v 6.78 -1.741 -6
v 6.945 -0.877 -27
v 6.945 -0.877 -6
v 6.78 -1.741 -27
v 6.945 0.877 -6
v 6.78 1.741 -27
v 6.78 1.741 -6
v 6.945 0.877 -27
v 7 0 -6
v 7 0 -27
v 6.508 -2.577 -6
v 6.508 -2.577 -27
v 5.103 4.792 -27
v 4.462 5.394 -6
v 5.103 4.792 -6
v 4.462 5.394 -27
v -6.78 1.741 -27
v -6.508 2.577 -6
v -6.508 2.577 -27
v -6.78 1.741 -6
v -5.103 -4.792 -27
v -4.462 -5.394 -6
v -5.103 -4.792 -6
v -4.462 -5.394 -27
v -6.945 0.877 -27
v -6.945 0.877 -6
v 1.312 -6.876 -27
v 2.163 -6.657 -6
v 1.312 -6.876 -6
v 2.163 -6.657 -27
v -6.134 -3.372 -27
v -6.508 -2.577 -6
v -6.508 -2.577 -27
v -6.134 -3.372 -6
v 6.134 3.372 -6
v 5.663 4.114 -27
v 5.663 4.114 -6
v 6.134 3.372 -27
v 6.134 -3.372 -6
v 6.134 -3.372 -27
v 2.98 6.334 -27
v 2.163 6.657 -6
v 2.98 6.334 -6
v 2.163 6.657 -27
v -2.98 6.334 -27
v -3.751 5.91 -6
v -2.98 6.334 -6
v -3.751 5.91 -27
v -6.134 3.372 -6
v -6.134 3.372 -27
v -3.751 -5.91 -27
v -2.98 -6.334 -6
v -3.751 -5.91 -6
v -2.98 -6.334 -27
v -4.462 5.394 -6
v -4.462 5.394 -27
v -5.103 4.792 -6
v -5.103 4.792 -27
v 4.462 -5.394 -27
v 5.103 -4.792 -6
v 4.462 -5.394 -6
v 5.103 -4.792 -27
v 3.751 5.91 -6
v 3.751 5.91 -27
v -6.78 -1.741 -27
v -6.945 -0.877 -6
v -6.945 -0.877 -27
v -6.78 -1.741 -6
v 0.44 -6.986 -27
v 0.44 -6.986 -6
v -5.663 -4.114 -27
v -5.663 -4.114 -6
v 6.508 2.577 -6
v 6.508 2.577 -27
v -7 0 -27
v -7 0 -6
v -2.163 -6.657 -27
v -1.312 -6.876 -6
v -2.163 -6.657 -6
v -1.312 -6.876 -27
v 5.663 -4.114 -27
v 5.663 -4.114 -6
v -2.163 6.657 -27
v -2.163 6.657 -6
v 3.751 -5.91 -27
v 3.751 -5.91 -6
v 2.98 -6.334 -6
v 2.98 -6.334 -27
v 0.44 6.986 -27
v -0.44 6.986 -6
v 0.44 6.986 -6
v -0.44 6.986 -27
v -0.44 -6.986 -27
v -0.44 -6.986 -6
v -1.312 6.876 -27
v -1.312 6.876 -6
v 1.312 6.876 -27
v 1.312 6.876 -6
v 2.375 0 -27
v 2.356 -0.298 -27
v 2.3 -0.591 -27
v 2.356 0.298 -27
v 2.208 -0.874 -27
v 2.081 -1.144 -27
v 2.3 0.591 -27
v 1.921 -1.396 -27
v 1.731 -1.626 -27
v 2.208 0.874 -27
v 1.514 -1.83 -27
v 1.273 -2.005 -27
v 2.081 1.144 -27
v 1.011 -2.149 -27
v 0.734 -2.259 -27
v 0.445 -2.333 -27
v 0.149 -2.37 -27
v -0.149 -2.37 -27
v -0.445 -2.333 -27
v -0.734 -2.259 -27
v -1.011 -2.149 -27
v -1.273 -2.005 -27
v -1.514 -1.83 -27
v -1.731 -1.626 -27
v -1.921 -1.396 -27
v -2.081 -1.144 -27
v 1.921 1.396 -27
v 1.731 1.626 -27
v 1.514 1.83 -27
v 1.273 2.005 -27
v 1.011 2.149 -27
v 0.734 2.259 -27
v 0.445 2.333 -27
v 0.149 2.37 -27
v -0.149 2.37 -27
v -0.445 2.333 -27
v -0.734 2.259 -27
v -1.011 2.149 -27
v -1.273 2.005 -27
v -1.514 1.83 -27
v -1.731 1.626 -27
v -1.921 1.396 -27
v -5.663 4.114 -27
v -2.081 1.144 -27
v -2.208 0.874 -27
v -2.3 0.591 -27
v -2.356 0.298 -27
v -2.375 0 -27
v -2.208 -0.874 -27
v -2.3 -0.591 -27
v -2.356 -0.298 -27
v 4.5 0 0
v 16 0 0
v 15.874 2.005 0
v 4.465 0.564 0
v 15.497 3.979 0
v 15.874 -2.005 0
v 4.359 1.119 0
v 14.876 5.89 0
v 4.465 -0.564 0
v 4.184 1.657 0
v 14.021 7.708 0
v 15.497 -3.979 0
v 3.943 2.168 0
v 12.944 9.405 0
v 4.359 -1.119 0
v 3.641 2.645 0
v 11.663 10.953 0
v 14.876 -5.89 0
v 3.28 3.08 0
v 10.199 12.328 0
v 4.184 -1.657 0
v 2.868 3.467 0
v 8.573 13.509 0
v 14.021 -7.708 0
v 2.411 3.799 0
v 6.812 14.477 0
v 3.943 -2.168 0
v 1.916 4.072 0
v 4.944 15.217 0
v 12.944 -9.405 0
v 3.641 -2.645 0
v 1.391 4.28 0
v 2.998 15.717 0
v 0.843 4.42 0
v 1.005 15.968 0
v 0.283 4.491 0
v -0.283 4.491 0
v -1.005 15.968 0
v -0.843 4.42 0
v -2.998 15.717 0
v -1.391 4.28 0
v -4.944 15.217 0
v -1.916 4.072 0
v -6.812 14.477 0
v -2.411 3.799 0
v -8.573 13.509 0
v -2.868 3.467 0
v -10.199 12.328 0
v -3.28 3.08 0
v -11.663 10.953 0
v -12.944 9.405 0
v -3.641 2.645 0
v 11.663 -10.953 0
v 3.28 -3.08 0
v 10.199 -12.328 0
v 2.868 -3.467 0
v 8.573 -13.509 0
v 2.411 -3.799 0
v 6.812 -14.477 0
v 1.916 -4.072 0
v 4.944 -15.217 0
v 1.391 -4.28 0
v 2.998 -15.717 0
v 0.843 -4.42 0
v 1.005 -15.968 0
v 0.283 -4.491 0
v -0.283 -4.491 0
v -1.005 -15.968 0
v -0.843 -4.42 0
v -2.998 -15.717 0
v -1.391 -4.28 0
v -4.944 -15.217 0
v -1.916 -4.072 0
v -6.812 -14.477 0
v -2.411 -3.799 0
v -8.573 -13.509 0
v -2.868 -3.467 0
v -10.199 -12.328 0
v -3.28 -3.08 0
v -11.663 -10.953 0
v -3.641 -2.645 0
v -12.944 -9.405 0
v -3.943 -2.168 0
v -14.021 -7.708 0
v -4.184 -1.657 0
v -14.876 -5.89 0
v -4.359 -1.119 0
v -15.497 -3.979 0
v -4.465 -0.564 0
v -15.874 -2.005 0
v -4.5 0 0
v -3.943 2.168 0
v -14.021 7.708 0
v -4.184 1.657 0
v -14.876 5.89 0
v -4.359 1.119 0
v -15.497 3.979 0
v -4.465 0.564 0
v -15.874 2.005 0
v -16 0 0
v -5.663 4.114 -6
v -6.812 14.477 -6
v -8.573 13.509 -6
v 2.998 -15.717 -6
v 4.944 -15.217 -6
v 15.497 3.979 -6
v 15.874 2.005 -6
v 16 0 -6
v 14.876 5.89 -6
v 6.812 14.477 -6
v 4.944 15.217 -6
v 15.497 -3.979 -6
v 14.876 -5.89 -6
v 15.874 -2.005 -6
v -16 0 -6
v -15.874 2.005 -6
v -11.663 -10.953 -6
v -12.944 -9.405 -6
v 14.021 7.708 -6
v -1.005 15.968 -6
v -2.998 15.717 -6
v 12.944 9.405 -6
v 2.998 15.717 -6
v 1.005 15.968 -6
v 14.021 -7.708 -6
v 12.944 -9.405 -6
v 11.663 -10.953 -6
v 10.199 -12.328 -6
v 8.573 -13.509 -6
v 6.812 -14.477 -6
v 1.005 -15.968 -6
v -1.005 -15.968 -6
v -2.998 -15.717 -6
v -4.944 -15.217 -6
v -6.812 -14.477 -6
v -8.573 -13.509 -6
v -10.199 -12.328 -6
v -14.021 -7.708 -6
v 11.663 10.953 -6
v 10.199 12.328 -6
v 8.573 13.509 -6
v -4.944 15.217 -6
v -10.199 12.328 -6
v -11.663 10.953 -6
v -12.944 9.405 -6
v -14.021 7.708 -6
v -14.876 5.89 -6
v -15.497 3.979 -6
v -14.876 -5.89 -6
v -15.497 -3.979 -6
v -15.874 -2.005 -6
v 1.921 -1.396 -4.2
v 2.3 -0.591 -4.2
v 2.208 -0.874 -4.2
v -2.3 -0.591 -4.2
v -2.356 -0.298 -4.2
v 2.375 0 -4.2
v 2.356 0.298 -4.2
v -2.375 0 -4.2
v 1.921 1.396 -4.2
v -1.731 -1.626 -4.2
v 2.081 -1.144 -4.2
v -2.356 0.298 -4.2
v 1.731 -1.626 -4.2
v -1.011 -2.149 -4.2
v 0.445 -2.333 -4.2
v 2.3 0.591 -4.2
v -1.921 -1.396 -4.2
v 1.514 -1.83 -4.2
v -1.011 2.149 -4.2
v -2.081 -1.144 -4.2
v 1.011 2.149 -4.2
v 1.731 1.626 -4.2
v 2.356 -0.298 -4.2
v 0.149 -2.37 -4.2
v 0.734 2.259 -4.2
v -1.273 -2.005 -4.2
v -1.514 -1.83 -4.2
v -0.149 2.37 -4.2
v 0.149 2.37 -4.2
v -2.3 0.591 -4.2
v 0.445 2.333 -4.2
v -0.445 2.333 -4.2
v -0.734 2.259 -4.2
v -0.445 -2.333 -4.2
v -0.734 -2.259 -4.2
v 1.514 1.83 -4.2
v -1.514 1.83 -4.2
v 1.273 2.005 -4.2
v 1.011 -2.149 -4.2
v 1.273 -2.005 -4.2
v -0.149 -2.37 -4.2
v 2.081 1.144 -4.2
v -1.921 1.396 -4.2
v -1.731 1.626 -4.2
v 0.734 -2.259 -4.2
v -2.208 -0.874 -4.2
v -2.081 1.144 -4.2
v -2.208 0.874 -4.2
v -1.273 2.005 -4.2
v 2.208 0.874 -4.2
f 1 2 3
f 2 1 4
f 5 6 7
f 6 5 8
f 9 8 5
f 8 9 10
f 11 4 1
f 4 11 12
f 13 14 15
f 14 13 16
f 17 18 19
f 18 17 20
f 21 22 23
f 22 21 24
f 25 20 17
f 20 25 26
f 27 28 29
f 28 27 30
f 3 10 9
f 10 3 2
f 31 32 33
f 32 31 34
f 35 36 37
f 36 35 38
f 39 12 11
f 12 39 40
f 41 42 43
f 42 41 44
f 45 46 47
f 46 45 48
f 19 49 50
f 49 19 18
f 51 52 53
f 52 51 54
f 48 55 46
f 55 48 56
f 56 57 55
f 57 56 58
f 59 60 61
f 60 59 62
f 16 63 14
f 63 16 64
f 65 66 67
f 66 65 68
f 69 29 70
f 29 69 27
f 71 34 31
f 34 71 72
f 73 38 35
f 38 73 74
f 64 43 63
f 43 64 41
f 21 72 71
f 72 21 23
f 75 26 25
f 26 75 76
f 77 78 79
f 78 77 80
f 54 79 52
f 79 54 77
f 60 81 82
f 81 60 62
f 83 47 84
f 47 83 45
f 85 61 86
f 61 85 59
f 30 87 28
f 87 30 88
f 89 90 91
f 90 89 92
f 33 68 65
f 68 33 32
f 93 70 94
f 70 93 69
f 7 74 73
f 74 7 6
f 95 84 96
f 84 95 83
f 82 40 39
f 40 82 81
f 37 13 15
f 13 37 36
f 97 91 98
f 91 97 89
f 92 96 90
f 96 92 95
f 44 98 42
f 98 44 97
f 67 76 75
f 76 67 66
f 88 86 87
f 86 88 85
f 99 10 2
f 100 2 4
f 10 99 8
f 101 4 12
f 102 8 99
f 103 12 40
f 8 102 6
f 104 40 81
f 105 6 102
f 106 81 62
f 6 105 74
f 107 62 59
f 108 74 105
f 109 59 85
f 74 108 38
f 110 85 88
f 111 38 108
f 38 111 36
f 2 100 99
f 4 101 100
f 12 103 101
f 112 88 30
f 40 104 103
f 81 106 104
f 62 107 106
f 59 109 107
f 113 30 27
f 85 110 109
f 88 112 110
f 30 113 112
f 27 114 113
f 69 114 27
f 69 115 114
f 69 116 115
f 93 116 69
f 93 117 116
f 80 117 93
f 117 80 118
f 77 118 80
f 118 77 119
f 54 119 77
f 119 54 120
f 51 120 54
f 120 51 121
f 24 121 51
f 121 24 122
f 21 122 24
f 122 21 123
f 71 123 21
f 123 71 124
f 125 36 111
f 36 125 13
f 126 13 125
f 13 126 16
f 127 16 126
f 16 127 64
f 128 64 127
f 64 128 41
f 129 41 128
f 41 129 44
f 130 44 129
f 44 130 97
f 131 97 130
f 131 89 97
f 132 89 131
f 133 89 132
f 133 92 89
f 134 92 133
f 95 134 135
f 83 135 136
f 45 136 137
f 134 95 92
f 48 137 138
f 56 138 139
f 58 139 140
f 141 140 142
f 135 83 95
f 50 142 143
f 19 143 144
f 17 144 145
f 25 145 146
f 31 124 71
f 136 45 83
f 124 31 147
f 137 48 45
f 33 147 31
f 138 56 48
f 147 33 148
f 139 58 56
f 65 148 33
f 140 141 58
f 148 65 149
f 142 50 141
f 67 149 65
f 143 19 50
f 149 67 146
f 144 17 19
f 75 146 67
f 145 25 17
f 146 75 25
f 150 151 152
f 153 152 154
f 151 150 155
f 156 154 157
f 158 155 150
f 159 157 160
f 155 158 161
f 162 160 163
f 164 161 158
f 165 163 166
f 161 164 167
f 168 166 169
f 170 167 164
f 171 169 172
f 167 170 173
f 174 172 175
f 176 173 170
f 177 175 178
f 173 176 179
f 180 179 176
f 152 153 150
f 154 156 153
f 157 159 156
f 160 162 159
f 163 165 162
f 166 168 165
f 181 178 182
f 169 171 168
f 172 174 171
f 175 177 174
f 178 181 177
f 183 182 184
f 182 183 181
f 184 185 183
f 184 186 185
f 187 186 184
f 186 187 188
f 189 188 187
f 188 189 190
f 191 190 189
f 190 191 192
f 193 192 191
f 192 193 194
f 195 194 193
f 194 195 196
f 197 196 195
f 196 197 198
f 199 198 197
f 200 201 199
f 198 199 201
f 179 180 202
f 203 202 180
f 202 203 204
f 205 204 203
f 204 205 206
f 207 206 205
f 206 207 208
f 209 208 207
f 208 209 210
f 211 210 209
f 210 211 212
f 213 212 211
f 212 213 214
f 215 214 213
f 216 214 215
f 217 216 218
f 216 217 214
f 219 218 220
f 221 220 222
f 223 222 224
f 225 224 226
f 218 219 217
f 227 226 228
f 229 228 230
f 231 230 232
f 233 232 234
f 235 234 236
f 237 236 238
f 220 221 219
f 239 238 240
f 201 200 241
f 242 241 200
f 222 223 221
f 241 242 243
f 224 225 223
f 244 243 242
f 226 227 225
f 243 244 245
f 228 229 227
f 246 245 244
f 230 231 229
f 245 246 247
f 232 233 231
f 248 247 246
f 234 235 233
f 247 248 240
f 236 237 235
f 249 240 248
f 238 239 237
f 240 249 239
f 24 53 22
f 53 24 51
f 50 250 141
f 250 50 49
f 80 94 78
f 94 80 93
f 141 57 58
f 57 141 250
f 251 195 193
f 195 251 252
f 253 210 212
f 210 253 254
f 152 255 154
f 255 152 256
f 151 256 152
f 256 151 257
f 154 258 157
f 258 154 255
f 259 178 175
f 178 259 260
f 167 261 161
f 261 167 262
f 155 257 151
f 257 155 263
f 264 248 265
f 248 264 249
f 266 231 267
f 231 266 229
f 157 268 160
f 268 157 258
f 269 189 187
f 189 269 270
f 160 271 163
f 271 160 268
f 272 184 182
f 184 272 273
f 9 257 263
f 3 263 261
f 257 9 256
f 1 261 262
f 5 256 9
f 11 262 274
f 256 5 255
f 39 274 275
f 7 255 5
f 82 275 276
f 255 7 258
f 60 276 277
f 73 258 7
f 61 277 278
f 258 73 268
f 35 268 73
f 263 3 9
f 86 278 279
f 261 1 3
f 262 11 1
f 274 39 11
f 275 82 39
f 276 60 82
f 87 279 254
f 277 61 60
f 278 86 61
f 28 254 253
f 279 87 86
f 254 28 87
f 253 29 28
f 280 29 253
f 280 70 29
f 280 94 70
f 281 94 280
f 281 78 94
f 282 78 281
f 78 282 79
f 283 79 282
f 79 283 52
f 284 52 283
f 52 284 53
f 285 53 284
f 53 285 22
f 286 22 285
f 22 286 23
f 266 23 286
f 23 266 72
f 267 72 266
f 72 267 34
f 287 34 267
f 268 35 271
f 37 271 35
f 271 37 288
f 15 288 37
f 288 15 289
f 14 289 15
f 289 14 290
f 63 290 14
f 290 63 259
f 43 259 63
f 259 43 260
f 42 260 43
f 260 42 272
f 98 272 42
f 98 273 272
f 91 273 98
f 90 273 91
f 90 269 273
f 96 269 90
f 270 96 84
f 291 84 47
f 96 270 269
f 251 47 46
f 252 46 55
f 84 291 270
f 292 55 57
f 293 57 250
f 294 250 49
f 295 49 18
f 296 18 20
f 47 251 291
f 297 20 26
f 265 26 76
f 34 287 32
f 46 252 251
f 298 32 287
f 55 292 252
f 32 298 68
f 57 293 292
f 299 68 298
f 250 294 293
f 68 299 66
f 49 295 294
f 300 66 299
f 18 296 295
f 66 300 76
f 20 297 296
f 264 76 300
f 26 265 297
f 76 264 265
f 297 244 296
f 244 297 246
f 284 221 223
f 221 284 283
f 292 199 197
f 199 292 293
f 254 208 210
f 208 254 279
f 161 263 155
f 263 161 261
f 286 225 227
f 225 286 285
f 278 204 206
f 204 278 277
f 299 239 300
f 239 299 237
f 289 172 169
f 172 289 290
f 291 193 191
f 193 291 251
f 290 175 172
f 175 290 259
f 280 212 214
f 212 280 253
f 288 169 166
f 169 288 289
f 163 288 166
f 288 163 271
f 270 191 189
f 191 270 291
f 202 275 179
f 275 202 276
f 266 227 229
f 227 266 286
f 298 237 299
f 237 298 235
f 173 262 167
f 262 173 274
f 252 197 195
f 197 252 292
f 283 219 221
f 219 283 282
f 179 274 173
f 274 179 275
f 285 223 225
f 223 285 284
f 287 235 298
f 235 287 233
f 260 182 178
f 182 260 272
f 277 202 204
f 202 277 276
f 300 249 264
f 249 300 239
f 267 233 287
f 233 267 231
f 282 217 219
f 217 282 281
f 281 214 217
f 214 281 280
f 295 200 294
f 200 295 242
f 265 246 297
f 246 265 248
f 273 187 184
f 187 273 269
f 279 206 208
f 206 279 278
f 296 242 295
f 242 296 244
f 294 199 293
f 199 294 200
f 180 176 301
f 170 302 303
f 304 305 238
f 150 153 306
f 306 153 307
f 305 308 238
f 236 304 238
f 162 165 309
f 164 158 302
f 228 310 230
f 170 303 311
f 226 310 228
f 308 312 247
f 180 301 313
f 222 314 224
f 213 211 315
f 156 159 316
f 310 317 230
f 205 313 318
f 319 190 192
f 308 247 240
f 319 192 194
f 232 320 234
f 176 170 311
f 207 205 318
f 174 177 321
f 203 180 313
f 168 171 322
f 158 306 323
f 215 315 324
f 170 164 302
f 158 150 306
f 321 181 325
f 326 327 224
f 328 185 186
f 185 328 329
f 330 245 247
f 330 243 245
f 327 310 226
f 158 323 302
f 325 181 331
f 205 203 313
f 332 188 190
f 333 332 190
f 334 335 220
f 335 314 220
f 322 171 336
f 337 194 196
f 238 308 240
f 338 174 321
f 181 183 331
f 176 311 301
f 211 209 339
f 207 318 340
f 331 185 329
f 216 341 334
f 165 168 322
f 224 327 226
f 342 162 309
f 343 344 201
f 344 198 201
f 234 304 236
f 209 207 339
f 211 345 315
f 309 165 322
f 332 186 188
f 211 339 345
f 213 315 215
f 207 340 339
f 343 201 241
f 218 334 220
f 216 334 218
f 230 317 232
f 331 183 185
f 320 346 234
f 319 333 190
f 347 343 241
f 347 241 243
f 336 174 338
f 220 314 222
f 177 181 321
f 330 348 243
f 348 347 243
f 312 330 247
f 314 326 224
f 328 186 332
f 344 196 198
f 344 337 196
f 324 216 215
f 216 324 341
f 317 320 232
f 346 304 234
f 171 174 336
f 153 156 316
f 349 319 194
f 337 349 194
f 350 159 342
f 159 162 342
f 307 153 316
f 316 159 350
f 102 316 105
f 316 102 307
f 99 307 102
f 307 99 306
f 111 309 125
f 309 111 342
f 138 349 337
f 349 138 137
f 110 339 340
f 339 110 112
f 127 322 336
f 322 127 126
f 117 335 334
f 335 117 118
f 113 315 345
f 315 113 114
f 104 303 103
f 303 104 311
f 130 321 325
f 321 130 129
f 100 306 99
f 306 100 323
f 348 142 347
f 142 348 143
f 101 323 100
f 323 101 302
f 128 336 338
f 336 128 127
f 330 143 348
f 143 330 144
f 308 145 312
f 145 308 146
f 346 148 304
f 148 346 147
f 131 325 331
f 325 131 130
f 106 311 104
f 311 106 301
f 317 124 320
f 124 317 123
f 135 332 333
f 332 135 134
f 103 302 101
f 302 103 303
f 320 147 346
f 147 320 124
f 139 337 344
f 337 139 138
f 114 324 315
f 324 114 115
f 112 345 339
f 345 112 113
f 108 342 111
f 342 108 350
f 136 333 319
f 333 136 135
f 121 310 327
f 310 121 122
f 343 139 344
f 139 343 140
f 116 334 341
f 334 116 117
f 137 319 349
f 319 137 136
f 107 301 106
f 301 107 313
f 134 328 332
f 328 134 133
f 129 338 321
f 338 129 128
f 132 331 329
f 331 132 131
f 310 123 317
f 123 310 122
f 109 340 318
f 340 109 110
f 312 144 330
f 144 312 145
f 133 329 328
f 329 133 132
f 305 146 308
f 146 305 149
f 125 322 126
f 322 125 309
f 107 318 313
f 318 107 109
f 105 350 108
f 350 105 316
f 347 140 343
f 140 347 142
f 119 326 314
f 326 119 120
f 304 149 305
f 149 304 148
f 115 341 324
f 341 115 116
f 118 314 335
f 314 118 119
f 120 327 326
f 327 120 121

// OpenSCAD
$fn = 50;


difference() {
	union() {
		translate(v = [0, 0, -27.0000000000]) {
			cylinder(h = 27, r = 7.0000000000);
		}
		translate(v = [0, 0, -6.0000000000]) {
			cylinder(h = 6, r = 16.0000000000);
		}
	}
	union() {
		translate(v = [0, 0, 0]) {
			rotate(a = [0, 0, 0]) {
				difference() {
					union() {
						#translate(v = [0, 0, -27.0000000000]) {
							cylinder(h = 27, r = 2.2500000000);
						}
						#translate(v = [0, 0, -4.2000000000]) {
							cylinder(h = 4.2000000000, r1 = 2.3750000000, r2 = 4.5000000000);
						}
						#translate(v = [0, 0, -27.0000000000]) {
							cylinder(h = 27, r = 2.3750000000);
						}
						#translate(v = [0, 0, -27.0000000000]) {
							cylinder(h = 27, r = 2.2500000000);
						}
					}
					union();
				}
			}
		}
	}
}
